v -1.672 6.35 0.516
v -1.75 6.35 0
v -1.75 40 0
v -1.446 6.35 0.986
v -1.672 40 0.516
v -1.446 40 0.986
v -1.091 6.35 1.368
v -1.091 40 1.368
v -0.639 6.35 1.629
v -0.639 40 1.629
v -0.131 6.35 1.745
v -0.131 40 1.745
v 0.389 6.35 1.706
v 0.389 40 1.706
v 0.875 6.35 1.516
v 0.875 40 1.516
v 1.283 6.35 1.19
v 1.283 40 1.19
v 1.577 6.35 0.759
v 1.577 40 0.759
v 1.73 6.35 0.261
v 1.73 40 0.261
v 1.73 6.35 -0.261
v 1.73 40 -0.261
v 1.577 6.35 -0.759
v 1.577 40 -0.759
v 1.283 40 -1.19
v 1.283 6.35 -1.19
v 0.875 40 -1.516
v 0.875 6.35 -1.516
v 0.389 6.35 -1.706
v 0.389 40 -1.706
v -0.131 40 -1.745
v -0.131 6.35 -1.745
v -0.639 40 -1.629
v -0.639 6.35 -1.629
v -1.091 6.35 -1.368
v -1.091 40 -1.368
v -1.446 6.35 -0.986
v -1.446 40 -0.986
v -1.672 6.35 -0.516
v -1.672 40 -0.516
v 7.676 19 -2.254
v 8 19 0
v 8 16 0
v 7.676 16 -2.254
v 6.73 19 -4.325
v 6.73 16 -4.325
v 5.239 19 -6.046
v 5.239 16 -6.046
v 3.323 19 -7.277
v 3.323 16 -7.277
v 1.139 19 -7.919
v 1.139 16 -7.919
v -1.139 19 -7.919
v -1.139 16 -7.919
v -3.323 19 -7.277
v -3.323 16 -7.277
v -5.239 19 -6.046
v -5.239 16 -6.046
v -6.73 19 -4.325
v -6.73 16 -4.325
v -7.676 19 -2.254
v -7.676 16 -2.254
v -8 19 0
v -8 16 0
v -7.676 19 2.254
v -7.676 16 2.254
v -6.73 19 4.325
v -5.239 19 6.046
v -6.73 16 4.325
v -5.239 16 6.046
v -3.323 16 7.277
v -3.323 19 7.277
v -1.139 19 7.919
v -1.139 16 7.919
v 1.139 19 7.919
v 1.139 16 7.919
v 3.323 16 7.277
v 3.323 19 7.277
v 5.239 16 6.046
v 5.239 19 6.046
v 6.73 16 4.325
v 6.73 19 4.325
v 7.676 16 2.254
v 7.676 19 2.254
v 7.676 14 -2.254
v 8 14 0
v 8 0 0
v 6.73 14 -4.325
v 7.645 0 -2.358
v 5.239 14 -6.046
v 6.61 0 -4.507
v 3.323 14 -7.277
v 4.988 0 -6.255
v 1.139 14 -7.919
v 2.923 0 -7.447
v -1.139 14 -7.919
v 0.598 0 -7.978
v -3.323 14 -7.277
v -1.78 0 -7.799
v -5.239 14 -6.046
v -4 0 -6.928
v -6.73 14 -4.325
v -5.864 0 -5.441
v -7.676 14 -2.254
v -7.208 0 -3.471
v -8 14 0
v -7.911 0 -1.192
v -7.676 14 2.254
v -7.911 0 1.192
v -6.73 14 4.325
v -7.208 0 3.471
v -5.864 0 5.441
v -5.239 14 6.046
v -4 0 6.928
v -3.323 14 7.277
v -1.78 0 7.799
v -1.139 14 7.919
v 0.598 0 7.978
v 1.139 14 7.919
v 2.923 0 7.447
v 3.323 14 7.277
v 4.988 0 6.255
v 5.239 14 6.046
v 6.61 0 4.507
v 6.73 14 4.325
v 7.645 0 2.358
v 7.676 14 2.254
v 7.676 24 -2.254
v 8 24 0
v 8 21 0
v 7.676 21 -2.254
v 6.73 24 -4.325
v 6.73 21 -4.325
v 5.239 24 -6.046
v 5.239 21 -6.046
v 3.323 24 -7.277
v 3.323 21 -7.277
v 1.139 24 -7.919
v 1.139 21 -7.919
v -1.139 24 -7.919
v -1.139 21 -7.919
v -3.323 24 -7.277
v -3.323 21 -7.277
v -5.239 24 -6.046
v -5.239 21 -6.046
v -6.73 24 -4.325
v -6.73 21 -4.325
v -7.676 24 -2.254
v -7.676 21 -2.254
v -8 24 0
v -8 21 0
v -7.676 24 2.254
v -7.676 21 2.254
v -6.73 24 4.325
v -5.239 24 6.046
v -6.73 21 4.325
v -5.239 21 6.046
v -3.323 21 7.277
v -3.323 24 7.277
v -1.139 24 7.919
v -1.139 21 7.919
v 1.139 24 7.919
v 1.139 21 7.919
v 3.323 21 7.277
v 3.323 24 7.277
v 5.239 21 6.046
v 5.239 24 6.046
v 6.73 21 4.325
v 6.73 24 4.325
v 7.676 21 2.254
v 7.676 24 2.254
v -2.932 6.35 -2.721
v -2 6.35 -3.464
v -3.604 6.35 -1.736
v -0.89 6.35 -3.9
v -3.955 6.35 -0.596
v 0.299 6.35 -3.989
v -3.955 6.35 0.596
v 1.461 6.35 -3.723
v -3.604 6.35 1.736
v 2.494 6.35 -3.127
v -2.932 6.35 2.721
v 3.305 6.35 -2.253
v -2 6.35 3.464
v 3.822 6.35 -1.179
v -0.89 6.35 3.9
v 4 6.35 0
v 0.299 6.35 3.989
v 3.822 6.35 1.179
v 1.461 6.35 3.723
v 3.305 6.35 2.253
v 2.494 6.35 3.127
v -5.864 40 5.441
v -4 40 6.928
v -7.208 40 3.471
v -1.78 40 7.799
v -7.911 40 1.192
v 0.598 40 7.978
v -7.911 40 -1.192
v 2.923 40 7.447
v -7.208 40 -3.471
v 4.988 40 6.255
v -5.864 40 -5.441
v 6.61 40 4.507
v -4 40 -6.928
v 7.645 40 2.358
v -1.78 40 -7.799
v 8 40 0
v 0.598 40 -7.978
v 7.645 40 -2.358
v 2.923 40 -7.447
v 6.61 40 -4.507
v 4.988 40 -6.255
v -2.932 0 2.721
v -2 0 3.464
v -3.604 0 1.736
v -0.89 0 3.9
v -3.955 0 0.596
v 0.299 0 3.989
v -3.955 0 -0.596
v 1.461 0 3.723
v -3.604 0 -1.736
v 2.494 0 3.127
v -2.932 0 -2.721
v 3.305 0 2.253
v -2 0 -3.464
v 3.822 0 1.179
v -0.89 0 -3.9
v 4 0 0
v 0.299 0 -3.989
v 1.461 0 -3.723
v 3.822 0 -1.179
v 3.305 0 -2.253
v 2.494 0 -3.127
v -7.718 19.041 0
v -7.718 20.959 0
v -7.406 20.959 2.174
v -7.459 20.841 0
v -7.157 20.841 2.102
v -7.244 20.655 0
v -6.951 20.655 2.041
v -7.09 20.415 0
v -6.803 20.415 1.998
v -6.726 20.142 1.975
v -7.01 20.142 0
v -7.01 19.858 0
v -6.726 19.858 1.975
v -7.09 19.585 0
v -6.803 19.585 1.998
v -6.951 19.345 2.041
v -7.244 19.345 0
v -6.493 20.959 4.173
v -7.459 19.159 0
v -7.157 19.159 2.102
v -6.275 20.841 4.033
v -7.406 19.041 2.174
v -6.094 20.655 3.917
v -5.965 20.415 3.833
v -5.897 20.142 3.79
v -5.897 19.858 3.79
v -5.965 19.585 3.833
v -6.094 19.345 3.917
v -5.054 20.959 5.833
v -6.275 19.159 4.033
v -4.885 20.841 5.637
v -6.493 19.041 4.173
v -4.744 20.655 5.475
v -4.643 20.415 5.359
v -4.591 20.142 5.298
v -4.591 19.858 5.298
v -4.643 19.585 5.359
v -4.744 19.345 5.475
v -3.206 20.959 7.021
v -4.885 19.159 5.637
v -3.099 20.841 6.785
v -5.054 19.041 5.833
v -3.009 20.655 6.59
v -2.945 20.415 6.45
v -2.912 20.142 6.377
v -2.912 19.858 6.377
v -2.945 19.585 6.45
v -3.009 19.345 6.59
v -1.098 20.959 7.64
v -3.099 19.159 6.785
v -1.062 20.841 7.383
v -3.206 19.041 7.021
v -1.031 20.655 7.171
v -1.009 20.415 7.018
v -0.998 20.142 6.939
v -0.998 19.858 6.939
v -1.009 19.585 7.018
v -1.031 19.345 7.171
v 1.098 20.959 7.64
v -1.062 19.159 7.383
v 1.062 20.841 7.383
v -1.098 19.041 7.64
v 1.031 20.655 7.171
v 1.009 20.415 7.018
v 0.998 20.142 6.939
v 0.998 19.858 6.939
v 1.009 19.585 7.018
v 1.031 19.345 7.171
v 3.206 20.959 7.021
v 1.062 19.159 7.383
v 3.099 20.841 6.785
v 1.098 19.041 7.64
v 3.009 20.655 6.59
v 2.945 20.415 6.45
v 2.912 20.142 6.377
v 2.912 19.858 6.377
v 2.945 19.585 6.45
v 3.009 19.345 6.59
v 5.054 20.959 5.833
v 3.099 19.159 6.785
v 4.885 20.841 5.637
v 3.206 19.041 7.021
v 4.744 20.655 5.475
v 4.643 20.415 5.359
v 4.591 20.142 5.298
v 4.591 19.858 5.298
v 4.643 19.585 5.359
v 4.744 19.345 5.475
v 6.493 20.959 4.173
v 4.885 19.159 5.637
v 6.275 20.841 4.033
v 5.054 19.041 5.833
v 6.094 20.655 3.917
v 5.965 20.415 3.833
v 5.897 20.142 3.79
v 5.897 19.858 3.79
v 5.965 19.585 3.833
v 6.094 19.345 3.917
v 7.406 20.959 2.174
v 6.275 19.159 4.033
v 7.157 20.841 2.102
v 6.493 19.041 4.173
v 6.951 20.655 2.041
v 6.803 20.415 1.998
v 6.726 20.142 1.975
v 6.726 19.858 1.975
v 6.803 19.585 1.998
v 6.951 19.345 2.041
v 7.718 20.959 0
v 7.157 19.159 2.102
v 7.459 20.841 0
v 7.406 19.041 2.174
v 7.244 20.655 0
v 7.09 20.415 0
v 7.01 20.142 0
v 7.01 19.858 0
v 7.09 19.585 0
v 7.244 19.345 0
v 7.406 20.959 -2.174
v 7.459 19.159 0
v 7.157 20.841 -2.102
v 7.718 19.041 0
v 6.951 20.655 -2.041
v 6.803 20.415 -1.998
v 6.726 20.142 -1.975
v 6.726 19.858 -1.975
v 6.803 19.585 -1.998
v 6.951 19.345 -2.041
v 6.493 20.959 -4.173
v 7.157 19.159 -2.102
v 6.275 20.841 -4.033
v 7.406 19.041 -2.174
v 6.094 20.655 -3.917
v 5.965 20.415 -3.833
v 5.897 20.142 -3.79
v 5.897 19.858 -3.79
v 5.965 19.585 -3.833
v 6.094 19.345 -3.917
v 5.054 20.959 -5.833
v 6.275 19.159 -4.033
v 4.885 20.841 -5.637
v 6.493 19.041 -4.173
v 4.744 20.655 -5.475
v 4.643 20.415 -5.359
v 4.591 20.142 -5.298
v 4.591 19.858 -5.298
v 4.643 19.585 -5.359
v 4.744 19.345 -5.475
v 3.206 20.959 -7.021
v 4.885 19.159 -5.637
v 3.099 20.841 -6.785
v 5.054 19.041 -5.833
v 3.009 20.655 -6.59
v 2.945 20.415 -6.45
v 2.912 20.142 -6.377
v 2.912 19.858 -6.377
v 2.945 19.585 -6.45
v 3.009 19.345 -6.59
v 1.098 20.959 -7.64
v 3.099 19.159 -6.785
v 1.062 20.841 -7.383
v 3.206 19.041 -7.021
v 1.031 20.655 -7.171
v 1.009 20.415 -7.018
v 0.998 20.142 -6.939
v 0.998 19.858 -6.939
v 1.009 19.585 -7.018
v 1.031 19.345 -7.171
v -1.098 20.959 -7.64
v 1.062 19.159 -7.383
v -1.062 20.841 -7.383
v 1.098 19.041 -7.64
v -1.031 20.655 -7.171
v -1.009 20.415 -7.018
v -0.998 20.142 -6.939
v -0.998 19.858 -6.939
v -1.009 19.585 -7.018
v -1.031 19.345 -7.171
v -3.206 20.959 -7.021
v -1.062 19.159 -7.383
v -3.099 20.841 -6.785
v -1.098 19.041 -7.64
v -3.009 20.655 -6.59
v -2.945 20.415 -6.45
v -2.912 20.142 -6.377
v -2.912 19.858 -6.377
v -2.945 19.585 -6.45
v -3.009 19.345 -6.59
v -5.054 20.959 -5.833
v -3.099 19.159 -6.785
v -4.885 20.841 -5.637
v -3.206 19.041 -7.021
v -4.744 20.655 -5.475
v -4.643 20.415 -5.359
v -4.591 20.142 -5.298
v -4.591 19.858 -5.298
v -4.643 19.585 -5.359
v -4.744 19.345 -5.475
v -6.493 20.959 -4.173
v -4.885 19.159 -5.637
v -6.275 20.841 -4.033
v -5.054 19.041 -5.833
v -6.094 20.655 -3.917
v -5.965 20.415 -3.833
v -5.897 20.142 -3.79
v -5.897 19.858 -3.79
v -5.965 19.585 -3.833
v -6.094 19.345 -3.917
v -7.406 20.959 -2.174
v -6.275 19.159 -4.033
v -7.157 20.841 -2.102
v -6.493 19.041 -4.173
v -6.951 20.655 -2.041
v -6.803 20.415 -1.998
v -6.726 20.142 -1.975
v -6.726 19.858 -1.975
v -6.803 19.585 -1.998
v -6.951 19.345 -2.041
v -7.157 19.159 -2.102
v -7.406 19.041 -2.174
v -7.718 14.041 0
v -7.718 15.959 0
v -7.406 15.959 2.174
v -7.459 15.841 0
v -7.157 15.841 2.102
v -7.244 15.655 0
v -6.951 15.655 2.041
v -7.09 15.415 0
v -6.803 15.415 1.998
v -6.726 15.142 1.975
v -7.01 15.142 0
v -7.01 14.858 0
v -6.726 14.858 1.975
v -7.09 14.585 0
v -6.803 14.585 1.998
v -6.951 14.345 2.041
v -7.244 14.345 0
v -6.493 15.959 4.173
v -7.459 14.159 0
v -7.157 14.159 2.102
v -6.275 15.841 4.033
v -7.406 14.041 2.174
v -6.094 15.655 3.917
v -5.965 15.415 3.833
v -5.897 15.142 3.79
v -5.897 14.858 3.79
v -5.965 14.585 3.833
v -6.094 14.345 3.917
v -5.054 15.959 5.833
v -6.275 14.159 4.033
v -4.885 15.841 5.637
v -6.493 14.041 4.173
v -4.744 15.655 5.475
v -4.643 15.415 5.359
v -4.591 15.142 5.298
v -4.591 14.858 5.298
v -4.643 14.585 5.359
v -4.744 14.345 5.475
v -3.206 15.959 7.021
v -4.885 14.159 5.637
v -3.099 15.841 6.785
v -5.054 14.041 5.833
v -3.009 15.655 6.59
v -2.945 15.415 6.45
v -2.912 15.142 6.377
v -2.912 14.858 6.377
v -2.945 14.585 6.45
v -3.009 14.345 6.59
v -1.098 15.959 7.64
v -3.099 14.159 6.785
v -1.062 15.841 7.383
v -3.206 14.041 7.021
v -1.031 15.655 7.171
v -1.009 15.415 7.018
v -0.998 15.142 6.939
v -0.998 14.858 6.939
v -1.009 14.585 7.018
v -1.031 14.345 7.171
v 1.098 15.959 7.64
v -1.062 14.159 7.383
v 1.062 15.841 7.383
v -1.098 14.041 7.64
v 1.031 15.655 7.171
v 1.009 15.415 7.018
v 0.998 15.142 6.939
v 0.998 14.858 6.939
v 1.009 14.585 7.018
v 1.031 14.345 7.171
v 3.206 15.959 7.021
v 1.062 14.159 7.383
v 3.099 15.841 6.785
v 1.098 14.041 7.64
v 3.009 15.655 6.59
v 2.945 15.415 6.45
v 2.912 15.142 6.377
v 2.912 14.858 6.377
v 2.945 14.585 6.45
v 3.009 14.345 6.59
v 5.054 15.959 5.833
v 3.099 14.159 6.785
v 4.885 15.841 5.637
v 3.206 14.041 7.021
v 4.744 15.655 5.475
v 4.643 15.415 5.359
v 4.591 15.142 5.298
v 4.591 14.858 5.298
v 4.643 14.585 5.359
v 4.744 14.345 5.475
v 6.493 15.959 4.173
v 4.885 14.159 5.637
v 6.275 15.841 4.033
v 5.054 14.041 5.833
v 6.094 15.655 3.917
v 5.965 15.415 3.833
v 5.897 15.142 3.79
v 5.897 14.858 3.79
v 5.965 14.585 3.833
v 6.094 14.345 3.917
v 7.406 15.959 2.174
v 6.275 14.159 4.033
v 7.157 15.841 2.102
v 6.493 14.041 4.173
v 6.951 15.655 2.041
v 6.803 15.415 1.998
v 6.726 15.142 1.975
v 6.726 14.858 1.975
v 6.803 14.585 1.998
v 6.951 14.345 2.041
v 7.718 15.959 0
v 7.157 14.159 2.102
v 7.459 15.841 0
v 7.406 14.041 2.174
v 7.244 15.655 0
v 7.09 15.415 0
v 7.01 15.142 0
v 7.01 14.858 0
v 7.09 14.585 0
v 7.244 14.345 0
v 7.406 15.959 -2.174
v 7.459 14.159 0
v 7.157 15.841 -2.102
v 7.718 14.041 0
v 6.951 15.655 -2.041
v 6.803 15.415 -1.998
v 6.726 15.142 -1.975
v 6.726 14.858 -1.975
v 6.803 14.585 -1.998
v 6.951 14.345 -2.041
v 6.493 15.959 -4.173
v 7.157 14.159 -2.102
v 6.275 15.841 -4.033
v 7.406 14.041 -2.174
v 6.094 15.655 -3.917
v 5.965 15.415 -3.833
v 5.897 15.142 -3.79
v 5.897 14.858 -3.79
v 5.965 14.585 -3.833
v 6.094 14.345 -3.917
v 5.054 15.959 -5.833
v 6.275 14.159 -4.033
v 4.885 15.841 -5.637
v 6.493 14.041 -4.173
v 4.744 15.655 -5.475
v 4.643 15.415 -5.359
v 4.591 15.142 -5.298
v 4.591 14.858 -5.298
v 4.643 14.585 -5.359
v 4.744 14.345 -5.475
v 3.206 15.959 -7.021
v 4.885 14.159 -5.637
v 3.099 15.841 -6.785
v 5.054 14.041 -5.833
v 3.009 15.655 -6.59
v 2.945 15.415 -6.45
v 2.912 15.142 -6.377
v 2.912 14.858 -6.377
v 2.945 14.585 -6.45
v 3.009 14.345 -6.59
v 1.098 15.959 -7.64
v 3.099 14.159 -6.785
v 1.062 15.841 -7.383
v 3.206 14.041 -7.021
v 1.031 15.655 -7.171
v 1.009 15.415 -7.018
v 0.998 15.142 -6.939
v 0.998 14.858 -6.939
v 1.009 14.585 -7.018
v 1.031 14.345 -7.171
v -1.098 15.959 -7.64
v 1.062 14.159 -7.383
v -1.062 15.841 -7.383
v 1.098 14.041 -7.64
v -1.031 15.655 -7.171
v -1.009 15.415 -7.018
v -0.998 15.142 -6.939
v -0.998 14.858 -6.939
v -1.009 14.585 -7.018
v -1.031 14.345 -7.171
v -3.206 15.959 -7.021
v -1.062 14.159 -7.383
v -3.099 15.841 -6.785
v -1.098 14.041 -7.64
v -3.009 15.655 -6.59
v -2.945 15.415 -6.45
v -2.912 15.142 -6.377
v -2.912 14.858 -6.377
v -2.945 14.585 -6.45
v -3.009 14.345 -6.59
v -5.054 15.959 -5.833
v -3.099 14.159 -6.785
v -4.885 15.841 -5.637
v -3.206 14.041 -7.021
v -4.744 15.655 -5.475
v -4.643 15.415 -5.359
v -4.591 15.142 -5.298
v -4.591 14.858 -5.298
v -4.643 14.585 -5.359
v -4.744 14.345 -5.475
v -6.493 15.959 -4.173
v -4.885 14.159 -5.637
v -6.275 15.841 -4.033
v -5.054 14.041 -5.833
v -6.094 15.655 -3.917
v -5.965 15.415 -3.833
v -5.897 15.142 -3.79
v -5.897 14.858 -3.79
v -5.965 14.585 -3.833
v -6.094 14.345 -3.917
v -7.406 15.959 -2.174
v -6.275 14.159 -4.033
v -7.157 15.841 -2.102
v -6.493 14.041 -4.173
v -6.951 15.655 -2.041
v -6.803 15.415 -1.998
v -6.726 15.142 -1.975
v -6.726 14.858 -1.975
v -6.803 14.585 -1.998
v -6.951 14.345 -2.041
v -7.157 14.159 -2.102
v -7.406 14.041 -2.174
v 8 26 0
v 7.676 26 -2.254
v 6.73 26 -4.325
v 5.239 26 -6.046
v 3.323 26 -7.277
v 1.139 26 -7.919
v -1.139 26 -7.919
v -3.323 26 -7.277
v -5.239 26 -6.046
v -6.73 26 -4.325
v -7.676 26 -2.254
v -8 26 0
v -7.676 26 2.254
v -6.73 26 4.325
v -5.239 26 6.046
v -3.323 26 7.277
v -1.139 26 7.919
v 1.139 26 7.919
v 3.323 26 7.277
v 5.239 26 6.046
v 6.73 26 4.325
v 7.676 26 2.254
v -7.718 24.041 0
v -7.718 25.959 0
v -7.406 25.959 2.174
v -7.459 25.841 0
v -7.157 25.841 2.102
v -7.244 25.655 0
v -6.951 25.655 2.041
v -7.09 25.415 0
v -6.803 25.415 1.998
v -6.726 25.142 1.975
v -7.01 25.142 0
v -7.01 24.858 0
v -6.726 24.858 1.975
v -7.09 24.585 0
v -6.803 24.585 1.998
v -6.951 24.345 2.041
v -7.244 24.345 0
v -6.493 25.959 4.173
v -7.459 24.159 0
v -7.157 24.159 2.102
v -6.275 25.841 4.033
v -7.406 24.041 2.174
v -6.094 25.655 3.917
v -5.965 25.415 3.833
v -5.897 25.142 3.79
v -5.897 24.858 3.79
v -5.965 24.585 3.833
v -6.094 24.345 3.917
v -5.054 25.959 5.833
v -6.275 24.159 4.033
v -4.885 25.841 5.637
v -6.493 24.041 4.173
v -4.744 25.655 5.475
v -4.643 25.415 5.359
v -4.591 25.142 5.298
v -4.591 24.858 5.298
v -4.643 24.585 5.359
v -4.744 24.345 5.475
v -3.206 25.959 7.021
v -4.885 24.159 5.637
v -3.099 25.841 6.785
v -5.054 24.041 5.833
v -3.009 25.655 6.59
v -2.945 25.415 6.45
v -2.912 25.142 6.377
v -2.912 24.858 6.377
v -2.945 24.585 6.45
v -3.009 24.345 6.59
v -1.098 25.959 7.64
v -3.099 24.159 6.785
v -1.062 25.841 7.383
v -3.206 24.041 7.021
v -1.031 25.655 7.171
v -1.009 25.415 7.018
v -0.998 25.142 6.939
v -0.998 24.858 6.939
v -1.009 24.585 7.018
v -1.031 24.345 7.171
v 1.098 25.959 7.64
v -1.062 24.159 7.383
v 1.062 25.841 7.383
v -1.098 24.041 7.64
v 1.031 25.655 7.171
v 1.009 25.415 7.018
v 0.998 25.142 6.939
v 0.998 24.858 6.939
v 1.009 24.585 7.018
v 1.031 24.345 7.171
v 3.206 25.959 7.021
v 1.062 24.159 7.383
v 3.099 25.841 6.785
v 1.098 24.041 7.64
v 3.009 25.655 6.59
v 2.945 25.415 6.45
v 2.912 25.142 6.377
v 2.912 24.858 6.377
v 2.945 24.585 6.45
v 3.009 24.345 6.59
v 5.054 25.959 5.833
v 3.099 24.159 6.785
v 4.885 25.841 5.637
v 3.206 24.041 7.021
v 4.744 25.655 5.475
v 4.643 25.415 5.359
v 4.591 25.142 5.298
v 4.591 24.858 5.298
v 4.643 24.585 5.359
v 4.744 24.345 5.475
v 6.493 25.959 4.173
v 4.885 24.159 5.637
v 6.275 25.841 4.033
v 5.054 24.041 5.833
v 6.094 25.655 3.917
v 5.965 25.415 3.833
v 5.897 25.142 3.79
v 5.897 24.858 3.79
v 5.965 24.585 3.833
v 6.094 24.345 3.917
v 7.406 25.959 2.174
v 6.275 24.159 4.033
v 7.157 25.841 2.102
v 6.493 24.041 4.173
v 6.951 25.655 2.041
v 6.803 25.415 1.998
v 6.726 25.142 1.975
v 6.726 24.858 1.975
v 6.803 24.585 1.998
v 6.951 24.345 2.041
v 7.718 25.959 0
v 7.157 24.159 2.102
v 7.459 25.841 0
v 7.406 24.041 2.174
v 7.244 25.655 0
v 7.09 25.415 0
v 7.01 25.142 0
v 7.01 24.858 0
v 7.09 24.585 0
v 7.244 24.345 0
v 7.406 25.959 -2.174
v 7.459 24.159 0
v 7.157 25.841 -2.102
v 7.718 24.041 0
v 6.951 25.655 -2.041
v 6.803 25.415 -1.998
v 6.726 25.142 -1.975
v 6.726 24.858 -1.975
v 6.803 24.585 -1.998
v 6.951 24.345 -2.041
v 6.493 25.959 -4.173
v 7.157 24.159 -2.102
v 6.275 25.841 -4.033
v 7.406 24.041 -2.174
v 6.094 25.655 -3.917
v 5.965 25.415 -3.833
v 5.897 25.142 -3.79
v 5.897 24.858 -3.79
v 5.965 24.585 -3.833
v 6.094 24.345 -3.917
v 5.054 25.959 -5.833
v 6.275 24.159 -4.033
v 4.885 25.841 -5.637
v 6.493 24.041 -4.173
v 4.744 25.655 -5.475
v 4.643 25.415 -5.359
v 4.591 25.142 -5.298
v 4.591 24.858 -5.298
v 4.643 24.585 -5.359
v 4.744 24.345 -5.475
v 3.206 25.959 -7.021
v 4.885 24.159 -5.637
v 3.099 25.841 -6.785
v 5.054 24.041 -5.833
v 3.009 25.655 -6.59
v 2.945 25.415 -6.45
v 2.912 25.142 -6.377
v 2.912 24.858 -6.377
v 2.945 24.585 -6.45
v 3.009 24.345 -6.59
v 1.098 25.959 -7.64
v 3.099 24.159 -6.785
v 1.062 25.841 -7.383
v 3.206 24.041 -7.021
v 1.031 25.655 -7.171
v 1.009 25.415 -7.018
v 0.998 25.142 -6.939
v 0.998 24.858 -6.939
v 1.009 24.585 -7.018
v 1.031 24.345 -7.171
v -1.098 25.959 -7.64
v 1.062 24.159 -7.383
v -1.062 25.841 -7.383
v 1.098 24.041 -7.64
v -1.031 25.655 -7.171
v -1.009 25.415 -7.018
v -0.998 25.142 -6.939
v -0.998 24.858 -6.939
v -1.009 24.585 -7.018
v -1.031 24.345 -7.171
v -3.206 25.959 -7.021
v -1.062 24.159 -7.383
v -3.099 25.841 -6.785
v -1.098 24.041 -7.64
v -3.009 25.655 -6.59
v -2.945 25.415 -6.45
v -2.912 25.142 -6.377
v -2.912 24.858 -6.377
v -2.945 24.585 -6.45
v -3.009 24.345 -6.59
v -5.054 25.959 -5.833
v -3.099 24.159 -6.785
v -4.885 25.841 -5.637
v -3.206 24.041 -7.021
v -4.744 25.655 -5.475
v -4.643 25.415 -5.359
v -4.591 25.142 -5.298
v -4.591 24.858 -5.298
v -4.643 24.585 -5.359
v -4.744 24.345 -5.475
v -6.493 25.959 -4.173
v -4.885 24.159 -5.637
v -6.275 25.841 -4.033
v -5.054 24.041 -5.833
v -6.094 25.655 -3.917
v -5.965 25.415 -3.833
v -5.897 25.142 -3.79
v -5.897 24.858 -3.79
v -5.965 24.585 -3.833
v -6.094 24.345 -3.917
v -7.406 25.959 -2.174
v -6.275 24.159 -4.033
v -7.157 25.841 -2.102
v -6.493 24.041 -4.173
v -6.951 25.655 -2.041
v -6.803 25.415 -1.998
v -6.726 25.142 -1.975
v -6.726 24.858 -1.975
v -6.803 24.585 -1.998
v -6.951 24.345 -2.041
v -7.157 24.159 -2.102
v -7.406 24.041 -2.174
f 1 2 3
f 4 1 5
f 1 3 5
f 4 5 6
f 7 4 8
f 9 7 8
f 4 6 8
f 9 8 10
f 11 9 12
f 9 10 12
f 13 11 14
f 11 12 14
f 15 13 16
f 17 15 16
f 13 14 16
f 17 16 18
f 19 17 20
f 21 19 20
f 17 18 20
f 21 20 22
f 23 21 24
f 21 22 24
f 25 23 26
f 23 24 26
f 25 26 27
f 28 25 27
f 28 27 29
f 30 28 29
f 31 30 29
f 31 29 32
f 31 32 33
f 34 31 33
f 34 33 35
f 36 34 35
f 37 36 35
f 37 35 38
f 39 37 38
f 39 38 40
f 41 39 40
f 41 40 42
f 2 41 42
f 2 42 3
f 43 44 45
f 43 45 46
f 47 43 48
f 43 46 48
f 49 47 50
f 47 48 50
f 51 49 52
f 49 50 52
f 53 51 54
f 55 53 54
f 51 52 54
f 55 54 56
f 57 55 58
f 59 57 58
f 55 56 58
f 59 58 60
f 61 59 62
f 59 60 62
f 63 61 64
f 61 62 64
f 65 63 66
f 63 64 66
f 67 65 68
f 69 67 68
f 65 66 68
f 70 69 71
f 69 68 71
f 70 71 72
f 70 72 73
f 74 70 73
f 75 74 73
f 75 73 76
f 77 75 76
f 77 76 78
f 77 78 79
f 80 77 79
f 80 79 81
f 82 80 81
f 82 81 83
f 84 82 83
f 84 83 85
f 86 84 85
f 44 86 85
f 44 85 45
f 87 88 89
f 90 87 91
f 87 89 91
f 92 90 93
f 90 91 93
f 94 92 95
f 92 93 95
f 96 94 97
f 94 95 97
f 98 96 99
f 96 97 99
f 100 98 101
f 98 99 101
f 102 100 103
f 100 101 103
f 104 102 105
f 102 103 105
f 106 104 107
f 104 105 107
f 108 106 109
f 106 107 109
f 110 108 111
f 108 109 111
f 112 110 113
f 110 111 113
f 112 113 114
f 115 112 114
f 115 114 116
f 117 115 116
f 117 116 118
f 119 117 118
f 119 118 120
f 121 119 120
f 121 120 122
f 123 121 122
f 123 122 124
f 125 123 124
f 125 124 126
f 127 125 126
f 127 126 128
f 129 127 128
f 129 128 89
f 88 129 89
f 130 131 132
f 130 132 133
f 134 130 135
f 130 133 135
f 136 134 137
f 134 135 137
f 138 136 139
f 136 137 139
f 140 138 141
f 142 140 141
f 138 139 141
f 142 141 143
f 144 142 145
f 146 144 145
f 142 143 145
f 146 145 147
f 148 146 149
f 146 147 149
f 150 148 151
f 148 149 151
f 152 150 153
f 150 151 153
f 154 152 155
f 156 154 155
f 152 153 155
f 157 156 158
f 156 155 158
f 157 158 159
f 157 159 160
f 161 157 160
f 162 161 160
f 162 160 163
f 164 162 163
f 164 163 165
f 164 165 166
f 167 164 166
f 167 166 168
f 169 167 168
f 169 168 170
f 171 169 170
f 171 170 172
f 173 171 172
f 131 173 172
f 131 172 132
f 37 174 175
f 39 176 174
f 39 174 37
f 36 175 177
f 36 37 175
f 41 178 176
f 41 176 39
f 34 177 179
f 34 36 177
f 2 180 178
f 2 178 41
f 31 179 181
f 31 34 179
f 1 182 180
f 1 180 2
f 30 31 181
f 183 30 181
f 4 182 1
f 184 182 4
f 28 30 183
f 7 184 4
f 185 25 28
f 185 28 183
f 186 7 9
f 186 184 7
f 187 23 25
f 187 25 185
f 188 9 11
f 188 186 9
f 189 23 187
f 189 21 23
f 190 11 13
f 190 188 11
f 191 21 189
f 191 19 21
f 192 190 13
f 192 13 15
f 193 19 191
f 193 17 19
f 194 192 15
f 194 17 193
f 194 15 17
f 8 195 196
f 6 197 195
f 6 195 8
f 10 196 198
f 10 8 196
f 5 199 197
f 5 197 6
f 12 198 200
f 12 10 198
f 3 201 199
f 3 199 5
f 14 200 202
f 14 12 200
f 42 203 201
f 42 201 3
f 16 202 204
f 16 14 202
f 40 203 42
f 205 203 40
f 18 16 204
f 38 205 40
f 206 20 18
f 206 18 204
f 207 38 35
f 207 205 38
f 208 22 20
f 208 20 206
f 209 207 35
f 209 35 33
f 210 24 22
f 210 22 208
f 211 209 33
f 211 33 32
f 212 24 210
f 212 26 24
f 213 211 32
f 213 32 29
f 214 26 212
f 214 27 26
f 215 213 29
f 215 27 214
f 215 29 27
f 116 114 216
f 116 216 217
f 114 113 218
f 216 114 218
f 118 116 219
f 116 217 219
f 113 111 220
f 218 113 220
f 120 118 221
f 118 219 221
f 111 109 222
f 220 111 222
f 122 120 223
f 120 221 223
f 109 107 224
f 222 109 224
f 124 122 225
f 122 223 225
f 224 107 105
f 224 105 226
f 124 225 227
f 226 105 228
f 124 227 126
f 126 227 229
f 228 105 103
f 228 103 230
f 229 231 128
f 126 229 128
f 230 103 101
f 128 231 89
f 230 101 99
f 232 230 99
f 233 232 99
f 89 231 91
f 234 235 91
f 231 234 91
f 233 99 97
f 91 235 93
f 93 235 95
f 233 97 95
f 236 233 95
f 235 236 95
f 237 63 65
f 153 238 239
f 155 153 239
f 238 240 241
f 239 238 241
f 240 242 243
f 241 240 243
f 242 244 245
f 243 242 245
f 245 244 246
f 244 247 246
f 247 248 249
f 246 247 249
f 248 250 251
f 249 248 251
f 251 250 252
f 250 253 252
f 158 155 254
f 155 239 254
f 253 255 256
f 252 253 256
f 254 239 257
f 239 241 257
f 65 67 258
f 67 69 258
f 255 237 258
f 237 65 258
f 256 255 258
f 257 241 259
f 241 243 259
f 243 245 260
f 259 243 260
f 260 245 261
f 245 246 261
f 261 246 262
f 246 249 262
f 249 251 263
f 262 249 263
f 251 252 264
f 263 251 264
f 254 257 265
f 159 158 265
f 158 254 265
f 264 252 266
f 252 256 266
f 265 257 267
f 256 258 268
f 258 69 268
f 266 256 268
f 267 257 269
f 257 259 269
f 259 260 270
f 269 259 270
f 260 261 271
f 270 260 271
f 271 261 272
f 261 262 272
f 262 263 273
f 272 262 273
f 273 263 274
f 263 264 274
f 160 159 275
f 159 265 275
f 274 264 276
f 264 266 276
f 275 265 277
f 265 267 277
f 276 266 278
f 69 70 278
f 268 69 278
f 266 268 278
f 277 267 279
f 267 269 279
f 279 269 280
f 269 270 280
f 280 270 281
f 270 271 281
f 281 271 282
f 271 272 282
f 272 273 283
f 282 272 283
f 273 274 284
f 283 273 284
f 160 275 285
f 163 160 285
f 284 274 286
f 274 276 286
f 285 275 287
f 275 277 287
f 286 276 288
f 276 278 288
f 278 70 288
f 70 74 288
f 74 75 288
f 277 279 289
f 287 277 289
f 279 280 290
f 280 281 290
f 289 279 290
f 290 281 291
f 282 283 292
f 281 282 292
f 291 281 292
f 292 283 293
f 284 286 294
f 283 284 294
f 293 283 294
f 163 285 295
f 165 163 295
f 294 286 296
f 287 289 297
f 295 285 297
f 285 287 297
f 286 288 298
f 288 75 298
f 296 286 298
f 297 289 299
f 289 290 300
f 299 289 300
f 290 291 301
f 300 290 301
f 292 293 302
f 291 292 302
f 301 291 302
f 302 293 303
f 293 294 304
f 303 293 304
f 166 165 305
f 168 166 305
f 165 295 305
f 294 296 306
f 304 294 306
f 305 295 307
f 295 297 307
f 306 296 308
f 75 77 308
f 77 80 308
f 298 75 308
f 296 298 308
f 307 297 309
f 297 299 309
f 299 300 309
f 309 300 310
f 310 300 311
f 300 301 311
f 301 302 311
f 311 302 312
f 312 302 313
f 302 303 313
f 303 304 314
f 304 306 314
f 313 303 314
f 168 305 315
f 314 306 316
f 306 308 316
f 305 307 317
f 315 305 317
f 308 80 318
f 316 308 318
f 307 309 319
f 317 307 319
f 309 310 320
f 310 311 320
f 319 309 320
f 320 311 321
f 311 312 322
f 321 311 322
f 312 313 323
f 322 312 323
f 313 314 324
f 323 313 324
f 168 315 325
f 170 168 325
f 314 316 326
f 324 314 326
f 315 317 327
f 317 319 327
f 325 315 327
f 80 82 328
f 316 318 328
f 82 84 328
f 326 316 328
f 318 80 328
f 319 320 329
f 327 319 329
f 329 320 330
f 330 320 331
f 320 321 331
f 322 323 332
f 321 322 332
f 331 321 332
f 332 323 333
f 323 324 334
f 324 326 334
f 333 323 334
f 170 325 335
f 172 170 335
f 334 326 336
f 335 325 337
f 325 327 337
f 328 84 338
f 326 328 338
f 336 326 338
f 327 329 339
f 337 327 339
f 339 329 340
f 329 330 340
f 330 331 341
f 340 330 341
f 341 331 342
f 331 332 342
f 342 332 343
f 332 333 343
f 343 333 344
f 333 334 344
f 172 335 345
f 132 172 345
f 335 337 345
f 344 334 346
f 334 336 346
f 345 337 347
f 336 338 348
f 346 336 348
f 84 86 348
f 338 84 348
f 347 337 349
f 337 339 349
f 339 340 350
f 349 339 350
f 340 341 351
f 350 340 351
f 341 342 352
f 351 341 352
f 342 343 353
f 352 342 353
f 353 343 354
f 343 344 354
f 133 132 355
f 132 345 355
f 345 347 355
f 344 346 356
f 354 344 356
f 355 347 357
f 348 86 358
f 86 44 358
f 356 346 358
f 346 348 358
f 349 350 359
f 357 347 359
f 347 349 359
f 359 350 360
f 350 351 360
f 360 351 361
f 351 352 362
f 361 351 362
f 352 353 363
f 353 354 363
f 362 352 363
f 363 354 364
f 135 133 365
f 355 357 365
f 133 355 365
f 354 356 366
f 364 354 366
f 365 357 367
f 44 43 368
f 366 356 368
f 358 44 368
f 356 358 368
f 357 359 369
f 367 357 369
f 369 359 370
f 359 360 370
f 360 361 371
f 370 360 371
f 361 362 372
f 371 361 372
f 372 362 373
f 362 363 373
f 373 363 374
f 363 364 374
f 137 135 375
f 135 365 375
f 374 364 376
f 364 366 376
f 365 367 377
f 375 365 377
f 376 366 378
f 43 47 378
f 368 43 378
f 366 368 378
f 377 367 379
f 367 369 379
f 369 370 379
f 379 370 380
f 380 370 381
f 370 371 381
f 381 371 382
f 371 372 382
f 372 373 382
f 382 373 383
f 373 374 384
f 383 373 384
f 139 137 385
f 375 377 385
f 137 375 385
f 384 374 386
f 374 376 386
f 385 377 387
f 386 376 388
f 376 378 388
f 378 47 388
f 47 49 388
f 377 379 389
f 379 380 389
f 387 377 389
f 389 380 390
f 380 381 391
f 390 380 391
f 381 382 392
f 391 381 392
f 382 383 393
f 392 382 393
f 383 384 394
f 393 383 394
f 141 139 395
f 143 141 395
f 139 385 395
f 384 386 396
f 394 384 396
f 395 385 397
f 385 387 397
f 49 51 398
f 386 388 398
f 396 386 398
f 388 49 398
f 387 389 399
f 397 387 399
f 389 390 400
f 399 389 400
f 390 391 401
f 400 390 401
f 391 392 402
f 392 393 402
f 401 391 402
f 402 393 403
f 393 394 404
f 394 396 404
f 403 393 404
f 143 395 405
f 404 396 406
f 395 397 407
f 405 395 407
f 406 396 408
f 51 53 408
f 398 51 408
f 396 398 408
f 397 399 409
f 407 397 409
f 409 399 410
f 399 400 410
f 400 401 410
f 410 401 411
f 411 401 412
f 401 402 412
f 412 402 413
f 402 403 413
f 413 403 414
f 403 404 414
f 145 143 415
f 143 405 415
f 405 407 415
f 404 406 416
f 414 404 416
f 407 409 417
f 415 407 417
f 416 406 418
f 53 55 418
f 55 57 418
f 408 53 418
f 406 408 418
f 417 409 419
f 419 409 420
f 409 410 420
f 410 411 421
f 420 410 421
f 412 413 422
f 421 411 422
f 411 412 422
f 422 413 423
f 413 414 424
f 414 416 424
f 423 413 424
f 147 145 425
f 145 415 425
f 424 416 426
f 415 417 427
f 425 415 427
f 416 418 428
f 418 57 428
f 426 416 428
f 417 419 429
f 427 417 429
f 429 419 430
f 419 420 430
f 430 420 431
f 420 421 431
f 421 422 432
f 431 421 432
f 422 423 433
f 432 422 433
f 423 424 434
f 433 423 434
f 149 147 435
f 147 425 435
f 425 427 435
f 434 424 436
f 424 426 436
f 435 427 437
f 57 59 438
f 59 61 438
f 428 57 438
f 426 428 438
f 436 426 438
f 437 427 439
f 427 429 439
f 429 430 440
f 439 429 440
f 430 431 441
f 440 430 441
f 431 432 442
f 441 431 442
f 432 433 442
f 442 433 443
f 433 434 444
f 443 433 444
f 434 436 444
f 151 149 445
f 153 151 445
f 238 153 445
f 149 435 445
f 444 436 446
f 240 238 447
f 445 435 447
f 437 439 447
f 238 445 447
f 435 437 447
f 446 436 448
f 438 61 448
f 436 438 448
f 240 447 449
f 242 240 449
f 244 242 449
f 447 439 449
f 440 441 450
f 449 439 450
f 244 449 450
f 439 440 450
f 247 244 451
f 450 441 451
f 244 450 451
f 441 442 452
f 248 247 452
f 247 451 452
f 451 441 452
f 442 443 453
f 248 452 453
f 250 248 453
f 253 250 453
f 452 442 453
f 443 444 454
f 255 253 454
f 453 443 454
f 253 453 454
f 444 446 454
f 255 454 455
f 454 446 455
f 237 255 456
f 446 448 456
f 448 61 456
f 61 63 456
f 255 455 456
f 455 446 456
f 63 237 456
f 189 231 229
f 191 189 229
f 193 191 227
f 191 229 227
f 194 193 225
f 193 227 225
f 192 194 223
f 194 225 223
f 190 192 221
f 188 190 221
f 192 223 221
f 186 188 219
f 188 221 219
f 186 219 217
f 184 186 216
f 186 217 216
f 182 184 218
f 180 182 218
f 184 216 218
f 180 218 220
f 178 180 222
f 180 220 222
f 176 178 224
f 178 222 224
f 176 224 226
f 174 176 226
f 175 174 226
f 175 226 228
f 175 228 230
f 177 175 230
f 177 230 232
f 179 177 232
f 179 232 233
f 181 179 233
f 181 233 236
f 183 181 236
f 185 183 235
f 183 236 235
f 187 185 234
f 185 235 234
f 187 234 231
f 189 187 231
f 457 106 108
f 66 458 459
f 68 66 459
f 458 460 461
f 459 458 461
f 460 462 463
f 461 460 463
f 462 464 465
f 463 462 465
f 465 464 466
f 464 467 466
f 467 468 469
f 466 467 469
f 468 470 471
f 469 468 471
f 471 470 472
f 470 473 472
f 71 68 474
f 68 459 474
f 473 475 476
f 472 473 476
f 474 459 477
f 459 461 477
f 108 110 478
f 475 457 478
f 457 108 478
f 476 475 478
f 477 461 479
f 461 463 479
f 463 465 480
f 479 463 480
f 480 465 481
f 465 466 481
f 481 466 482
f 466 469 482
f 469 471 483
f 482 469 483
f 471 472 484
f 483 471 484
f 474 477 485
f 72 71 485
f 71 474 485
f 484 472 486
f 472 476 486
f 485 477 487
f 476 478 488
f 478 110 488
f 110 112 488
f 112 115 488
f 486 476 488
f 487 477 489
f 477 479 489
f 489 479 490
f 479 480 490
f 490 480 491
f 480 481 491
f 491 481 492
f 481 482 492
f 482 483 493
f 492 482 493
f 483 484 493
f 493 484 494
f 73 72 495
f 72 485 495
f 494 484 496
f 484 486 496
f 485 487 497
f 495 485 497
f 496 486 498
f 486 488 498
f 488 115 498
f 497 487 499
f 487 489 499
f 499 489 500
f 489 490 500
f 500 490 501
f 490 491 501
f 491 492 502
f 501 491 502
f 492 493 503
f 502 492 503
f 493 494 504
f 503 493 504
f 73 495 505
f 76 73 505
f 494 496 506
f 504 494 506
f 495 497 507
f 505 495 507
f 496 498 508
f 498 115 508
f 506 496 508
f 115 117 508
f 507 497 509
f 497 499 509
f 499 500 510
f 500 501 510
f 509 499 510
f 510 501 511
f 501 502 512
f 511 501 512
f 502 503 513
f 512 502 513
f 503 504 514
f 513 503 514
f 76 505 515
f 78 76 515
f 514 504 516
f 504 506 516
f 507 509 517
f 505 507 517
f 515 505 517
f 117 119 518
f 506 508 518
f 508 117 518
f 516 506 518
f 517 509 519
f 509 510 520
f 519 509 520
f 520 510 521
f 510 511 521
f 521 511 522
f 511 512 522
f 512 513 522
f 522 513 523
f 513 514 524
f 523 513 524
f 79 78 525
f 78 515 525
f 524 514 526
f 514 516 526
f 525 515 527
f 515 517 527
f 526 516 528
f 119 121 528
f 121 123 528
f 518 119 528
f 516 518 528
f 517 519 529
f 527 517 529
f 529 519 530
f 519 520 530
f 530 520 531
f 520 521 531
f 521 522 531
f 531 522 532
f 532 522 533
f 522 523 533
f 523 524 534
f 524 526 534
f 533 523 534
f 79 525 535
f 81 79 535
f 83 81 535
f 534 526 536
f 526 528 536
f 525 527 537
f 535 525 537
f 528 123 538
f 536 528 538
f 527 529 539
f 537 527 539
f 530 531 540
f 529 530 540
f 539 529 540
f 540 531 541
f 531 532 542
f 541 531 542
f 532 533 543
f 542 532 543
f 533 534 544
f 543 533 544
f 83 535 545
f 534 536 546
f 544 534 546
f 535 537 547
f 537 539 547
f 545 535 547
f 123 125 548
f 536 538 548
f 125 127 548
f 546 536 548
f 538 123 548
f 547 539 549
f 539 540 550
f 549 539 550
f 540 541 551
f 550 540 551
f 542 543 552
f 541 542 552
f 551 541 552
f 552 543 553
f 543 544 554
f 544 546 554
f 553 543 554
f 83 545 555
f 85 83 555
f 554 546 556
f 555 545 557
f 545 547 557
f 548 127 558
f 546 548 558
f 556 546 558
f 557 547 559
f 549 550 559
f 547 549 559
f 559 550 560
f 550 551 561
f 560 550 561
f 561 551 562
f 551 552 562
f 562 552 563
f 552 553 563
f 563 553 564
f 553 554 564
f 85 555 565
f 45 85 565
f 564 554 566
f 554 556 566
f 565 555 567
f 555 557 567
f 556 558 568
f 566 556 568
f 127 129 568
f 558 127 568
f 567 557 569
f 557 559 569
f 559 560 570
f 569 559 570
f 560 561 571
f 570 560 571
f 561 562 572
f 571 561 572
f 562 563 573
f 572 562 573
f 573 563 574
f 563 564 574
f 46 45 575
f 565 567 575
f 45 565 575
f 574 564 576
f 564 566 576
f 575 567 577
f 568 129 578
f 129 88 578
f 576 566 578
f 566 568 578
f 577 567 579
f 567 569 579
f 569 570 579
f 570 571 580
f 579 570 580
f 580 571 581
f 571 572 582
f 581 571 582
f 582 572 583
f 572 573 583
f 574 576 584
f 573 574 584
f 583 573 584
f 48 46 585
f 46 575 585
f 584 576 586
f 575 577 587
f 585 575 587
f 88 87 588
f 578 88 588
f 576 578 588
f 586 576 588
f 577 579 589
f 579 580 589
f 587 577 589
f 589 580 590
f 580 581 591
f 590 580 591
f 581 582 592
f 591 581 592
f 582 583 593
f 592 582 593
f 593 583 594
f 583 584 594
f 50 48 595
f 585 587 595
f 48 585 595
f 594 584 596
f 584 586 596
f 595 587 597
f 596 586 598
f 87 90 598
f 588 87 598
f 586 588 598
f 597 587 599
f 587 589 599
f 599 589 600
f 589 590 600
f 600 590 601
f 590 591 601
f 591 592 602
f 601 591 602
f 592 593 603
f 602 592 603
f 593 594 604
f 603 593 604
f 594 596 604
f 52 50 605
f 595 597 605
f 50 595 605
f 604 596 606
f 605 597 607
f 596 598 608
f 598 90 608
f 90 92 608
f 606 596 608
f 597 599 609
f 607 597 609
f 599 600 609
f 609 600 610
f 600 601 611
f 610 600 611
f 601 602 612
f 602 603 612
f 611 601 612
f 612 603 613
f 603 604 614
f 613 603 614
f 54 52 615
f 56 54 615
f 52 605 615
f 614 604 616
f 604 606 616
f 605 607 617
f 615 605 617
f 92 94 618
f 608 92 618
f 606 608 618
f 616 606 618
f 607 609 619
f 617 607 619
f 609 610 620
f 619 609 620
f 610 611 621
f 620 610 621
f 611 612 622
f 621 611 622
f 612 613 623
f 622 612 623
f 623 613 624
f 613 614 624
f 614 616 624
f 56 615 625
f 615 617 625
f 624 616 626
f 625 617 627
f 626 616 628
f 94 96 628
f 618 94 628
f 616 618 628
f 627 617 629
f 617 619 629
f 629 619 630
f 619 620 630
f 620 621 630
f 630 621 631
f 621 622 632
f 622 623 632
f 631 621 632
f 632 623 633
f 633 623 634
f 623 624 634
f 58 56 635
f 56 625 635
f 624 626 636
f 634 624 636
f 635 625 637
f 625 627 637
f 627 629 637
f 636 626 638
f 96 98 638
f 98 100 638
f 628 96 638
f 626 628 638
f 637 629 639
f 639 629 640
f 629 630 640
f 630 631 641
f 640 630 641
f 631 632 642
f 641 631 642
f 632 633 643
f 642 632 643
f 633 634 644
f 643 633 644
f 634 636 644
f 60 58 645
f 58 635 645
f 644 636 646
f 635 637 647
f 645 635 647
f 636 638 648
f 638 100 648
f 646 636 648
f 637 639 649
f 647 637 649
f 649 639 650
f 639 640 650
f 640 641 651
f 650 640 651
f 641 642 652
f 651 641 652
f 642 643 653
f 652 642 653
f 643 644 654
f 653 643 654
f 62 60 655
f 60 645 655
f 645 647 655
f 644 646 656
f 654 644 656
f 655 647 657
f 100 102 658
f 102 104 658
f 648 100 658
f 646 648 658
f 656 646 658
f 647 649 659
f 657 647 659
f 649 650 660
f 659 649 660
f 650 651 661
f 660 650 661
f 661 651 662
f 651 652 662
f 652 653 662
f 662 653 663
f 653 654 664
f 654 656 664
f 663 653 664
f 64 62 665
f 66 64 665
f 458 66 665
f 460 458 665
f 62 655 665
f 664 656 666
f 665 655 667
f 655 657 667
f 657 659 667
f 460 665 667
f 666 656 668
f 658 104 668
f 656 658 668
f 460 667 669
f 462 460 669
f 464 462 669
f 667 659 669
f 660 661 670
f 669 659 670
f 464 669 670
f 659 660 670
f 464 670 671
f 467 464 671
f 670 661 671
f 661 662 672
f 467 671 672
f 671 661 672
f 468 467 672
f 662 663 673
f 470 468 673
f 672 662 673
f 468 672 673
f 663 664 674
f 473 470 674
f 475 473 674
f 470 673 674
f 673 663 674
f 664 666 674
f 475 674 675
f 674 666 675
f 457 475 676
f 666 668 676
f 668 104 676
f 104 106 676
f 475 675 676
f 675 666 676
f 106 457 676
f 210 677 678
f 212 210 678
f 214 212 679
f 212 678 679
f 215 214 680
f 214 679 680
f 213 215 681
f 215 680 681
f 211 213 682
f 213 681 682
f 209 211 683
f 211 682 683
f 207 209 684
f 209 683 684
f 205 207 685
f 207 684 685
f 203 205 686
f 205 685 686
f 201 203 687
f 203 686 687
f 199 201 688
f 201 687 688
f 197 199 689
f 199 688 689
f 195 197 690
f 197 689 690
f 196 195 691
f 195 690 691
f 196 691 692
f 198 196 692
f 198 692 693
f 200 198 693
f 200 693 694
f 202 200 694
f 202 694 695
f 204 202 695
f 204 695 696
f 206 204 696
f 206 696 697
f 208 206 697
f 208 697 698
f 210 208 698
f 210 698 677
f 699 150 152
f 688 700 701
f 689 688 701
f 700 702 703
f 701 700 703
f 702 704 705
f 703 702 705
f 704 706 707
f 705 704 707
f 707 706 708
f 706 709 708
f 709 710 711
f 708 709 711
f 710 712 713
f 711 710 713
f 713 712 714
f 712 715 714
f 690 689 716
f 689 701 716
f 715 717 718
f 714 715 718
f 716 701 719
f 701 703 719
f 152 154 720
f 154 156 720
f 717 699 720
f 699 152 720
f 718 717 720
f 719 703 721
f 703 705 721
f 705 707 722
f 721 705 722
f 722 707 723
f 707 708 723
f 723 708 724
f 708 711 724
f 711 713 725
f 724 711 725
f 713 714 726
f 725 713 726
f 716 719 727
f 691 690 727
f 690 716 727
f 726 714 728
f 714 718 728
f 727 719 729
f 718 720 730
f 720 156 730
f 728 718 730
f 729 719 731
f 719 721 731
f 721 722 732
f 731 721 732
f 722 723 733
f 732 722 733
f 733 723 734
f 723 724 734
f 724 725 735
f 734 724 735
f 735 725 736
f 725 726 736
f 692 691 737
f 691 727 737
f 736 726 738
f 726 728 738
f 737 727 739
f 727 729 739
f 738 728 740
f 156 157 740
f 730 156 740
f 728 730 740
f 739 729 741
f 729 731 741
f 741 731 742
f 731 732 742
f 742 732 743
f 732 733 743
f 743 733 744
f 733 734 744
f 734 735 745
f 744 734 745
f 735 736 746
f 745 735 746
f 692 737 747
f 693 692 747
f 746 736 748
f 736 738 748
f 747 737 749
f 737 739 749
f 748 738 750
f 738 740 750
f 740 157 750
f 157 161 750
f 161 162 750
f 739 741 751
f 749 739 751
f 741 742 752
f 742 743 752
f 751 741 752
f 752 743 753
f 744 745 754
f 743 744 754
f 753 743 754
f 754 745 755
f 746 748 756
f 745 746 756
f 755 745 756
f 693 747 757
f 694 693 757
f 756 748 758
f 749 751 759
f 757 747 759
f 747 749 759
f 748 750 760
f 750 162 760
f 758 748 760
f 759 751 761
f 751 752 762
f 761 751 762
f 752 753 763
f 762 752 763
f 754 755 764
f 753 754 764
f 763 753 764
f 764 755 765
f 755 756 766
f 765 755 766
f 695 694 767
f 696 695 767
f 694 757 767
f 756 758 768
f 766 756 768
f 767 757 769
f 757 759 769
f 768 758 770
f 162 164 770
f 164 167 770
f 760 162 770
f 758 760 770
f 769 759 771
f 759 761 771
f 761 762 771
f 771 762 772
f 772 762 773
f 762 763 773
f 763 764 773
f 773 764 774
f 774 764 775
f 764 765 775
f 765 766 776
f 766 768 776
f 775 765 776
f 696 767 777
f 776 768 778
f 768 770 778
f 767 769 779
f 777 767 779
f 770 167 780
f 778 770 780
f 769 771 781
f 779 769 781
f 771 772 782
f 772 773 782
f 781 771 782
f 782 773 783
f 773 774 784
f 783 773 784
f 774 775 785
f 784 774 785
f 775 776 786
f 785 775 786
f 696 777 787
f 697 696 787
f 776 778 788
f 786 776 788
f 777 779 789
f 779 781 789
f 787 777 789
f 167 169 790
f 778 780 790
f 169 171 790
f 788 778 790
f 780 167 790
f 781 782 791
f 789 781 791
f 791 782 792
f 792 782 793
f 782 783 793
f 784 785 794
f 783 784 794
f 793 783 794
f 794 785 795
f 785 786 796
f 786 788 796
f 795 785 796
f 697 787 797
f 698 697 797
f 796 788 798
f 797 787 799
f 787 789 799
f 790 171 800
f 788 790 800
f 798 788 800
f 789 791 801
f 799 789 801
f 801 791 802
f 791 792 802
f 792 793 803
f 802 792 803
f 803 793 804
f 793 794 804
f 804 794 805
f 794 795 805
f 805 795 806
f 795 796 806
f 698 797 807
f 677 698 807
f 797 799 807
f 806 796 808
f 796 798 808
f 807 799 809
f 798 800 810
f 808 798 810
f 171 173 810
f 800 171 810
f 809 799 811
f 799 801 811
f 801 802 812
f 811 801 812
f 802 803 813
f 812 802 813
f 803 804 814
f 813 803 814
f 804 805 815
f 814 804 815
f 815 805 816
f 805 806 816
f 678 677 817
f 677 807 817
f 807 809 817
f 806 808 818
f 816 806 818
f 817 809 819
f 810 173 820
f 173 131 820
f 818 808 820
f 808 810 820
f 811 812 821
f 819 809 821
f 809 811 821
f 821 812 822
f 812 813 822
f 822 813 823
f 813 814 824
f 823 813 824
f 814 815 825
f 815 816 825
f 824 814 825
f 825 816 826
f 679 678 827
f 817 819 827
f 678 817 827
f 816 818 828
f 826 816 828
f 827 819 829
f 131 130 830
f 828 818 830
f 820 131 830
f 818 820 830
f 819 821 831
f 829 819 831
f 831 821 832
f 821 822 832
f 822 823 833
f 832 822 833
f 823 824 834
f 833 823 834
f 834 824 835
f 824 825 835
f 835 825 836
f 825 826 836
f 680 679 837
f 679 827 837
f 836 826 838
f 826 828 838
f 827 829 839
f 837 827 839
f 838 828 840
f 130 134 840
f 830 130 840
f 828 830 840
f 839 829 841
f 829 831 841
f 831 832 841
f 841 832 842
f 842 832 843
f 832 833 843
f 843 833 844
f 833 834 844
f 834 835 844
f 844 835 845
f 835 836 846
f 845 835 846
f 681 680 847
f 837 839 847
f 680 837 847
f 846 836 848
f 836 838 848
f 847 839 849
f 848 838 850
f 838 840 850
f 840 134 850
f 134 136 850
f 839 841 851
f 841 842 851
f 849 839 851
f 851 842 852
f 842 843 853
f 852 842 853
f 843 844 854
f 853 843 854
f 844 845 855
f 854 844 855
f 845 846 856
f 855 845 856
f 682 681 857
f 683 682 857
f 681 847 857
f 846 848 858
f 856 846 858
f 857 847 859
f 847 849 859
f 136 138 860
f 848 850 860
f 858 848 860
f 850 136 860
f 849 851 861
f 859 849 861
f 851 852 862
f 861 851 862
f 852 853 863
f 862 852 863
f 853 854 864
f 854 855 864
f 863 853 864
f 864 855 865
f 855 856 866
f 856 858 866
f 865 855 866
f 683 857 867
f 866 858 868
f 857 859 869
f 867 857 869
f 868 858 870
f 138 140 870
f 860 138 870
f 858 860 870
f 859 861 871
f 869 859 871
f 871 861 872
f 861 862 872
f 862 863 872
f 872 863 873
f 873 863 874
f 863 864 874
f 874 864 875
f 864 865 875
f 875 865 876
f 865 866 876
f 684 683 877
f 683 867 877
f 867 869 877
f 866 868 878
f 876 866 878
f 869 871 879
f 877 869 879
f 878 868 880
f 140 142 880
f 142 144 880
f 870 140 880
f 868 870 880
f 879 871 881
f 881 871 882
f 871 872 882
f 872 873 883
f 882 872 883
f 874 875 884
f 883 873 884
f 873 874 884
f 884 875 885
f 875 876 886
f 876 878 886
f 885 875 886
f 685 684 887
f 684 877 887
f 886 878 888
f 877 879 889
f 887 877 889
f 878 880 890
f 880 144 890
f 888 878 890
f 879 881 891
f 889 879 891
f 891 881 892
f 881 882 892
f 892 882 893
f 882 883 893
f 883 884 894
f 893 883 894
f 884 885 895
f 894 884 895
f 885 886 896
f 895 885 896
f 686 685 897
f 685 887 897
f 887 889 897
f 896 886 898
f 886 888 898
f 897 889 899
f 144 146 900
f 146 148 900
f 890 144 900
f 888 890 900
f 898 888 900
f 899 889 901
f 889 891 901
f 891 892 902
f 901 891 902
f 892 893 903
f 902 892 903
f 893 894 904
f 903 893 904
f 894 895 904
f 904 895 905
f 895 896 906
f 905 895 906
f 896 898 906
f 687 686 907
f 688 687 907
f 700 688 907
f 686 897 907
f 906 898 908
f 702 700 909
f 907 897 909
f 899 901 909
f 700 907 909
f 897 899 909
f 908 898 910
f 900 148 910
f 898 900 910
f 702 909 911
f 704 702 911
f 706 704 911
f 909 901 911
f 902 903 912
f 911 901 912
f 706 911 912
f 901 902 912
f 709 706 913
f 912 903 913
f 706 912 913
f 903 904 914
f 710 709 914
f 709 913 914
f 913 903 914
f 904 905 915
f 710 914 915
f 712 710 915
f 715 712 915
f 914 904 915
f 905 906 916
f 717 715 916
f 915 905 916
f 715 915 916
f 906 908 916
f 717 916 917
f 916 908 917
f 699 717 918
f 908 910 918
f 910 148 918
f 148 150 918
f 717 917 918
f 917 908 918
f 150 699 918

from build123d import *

# Parameters (mm, degrees)
SKETCH1_R      = 8
EXTRUDE1_DEPTH = 40
SKETCH2_R      = 1.75
EXTRUDE2_DEPTH = 40
SKETCH3_R      = 4
EXTRUDE3_DEPTH = 6.35
SKETCH4_R      = 1


with BuildPart() as part:
    # Sketch1 → Extrude1 (new body)
    with BuildSketch(Plane(origin=(0, 0, 0), x_dir=(1, 0, 0), z_dir=(0, 1, 0))):
        Circle(SKETCH1_R)
    extrude(amount=EXTRUDE1_DEPTH)

    # Sketch2 → Extrude2 (cut)
    with BuildSketch(Plane(origin=(0, 40, 0), x_dir=(-1, 0, 0), z_dir=(0, 1, 0))):
        Circle(SKETCH2_R)
    extrude(amount=-EXTRUDE2_DEPTH, mode=Mode.SUBTRACT)

    # Sketch3 → Extrude3 (cut)
    with BuildSketch(Plane.XZ):
        Circle(SKETCH3_R)
    extrude(amount=-EXTRUDE3_DEPTH, mode=Mode.SUBTRACT)

    # Cut-Sweep1: sweep along a path in Sketch6
    with BuildLine(Plane(origin=(0, 15, 0), x_dir=(-1, 0, 0), z_dir=(0, 1, 0))) as cut_sweep1_path:
        CenterArc((0, 0), 8, 0, 360)
    # Sketch4 → Cut-Sweep1 (sweep, cut)
    with BuildSketch(Plane.XY):
        with Locations((8, 20)):
            Circle(SKETCH4_R)
        with Locations((8, 25)):
            Circle(SKETCH4_R)
        with Locations((8, 15)):
            Circle(SKETCH4_R)
    sweep(path=cut_sweep1_path.line, mode=Mode.SUBTRACT)


solid = part.part
